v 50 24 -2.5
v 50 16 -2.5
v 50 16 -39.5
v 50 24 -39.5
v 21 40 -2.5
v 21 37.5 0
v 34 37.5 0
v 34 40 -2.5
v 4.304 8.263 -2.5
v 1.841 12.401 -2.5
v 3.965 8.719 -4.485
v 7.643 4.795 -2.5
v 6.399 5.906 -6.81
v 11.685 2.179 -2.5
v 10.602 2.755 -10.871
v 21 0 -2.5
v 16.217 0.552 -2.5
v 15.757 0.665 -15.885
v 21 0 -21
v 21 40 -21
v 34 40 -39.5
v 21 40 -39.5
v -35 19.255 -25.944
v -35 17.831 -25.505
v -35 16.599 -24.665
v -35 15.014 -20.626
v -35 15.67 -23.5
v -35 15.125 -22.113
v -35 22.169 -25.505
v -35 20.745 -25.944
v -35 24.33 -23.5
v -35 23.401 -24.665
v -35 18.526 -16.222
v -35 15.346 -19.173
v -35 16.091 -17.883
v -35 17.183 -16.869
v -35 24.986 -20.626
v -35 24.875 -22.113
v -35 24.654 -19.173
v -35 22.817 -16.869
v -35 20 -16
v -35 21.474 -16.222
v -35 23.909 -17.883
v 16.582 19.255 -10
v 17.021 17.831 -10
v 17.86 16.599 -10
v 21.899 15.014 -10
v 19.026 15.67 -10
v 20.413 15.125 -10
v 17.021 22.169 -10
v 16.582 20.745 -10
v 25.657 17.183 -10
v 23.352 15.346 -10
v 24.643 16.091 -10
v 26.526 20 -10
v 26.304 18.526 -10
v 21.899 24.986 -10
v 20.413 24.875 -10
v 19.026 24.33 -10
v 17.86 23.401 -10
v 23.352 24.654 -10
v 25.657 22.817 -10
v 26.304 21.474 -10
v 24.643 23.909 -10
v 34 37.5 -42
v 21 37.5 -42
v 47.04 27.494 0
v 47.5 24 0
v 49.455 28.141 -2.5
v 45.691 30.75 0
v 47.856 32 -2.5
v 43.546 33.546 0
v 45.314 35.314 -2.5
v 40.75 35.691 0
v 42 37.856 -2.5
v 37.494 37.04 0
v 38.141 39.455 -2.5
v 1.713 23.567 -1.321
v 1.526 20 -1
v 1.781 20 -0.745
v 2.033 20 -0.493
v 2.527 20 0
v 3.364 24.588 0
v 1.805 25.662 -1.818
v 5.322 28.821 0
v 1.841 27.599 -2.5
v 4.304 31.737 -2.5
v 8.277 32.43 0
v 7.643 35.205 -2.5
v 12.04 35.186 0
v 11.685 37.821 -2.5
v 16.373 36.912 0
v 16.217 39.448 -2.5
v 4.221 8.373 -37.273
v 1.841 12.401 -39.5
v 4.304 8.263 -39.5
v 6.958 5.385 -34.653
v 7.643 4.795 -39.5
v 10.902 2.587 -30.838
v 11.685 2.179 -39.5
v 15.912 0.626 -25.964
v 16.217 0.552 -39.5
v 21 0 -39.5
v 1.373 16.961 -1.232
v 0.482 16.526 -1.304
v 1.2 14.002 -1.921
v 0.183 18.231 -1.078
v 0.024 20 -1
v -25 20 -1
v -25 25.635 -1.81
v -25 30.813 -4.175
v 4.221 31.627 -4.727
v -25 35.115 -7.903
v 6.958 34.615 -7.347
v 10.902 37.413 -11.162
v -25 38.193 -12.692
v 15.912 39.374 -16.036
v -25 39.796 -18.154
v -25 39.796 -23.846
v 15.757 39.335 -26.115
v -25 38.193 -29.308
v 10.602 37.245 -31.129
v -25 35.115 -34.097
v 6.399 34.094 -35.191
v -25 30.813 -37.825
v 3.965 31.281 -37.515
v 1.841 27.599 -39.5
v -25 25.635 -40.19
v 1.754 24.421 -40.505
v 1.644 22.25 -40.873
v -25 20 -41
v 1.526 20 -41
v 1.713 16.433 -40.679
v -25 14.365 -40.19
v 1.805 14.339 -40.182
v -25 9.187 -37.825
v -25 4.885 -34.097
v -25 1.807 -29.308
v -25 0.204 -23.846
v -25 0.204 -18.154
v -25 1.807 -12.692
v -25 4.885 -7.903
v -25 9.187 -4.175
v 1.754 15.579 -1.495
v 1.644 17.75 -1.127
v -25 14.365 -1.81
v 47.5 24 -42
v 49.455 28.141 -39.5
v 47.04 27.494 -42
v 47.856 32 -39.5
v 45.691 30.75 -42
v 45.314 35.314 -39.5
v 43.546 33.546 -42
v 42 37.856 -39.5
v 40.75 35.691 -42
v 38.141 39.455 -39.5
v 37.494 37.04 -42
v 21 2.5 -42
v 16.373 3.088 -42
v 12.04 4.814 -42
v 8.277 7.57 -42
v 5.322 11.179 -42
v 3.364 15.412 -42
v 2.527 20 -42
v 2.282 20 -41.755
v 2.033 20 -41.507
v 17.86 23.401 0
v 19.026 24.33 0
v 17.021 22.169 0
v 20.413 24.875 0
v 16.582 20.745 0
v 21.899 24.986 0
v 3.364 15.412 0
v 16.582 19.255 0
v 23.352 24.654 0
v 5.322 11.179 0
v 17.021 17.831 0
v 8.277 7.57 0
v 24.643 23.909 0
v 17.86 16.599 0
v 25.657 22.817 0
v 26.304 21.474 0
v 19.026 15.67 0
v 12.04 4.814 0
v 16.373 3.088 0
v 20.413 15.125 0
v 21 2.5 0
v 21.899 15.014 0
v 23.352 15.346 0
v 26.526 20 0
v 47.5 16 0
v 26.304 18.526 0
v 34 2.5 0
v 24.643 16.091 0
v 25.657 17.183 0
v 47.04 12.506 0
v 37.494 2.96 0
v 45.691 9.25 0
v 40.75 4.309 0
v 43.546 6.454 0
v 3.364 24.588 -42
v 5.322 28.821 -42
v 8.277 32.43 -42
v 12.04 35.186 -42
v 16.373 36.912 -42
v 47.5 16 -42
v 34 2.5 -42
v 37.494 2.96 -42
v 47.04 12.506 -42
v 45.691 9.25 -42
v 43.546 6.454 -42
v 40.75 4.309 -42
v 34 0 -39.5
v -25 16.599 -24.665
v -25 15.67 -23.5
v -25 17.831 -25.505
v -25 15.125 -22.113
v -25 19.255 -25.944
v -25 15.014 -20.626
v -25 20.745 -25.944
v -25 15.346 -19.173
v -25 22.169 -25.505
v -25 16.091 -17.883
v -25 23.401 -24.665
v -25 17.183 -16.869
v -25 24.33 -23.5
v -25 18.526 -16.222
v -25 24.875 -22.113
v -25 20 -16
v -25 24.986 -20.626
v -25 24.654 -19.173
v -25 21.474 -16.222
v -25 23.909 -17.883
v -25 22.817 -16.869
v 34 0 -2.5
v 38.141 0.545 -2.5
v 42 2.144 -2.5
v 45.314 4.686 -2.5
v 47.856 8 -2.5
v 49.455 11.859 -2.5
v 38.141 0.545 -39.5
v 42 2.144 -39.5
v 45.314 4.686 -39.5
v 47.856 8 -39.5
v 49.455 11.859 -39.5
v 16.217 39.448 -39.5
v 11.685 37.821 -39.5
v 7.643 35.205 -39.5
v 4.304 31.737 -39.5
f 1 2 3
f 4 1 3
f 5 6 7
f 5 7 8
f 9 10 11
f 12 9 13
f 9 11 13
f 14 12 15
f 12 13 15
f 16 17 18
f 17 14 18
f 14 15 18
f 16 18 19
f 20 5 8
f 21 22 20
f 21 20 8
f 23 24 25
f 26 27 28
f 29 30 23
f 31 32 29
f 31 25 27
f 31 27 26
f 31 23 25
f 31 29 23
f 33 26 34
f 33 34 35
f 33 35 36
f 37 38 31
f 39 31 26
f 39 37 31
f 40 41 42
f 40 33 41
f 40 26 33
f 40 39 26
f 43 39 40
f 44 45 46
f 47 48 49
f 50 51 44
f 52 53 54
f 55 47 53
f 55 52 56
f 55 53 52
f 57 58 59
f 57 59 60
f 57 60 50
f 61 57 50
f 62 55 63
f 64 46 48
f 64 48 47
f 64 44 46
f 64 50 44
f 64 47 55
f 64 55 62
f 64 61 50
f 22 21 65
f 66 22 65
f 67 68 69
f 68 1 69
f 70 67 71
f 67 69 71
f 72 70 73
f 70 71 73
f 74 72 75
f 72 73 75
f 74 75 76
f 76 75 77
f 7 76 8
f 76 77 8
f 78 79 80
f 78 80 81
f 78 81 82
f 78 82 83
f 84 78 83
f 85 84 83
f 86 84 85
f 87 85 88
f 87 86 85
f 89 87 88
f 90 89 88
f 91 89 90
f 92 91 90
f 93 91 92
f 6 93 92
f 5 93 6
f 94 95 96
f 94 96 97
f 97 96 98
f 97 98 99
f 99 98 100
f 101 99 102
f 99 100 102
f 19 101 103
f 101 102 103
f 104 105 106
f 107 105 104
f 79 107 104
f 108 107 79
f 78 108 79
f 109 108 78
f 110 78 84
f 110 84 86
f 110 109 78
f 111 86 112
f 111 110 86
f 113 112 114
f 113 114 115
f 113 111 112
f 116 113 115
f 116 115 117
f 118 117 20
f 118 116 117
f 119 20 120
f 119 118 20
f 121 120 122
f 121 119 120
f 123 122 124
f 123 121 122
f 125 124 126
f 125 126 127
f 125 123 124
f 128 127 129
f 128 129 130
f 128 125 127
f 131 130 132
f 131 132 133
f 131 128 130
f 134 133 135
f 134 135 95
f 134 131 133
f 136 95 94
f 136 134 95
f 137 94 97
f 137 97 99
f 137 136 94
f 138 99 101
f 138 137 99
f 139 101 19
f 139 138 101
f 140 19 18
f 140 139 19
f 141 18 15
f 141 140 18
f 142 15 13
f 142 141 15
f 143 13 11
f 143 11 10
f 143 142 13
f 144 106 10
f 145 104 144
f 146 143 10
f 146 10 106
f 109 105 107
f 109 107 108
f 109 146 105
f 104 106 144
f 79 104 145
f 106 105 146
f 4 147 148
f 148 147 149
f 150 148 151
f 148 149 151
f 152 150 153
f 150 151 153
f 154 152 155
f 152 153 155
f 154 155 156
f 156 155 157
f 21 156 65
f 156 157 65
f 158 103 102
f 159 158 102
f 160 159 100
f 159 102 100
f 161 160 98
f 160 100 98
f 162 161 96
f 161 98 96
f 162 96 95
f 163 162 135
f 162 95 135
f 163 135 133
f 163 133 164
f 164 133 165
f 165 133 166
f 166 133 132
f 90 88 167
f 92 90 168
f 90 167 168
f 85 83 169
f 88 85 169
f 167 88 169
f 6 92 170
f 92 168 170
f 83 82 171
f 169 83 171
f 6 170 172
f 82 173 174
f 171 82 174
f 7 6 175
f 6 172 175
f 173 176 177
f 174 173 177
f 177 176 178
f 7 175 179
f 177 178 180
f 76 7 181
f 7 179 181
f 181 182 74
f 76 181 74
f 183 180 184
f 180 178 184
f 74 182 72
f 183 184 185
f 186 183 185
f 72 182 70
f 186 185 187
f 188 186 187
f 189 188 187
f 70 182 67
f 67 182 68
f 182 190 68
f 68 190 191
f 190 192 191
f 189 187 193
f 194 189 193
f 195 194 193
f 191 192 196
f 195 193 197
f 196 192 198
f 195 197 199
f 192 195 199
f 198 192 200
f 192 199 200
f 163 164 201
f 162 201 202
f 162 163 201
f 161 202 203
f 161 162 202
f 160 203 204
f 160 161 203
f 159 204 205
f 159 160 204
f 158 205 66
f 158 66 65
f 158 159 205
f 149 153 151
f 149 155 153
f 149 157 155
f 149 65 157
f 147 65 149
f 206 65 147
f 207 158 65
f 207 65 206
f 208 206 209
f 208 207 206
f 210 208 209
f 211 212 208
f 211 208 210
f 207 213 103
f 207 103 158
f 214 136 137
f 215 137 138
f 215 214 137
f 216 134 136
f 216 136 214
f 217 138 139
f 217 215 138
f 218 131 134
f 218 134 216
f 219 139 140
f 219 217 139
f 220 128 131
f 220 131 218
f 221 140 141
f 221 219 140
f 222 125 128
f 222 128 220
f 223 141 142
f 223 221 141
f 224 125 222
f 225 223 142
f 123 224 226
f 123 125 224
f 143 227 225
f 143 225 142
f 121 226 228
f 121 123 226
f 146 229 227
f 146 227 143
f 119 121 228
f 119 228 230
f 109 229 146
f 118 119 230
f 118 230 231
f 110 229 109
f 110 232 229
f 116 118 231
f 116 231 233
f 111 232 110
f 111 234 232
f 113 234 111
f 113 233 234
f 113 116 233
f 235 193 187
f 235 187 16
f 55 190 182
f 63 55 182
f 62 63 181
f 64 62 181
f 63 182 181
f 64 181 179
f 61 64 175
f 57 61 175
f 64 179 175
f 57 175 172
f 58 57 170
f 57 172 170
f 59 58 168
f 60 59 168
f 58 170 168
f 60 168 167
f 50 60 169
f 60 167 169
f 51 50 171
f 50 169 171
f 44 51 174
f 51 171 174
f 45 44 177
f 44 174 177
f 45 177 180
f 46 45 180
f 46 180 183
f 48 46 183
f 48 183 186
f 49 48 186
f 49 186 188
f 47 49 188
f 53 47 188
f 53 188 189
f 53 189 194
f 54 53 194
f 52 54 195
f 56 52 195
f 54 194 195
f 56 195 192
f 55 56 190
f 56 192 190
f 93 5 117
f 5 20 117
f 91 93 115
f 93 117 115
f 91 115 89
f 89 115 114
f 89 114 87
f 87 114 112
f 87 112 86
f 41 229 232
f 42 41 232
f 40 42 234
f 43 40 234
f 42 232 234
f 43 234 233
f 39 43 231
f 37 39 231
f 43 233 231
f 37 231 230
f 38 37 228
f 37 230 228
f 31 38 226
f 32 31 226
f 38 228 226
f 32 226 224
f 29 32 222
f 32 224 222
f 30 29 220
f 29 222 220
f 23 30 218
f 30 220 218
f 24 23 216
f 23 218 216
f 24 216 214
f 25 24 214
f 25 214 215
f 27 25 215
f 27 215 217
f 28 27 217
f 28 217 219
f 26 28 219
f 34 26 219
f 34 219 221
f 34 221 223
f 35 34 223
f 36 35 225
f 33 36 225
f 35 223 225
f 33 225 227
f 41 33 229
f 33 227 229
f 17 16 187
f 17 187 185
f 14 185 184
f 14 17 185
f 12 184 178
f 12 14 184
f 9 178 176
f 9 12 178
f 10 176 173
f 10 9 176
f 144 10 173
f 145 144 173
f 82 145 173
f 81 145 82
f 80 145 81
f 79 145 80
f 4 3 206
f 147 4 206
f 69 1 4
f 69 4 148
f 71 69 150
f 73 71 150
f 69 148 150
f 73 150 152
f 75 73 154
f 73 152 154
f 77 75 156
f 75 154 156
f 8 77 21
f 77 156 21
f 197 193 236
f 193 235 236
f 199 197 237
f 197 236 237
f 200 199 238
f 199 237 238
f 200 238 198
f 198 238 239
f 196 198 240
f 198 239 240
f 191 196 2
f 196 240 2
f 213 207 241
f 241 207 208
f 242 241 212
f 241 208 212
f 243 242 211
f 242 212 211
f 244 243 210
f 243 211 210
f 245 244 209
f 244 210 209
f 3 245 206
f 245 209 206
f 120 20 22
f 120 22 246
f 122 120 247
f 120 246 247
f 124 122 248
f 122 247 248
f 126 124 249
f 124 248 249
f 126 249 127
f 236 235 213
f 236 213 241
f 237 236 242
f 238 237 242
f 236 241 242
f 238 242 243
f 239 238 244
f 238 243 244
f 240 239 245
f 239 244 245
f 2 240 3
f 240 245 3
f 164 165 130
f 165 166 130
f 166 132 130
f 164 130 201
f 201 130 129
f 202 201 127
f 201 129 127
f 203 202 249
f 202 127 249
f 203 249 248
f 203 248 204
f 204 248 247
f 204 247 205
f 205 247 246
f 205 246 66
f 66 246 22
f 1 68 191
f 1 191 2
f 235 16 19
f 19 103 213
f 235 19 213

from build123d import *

# Parameters (mm, degrees)
SKETCH1_W           = 50
SKETCH1_H           = 42
BOSS_EXTRUDE1_DEPTH = 40
FILLET1_R           = 21
FILLET2_R           = 16
BOSS_EXTRUDE2_REACH = 96.81
SKETCH2_R           = 20
CHAMFER1_SIZE       = 2.5
SKETCH3_R           = 5
CUT_EXTRUDE1_DEPTH  = 10
SKETCH4_R           = 5
BOSS_EXTRUDE3_DEPTH = 10


with BuildPart() as part:
    # Sketch1 → Boss-Extrude1 (new body)
    with BuildSketch(Plane(origin=(0, 0, 0), x_dir=(1, 0, 0), z_dir=(0, 1, 0))):
        with Locations((25, 21)):
            Rectangle(SKETCH1_W, SKETCH1_H)
    extrude(amount=BOSS_EXTRUDE1_DEPTH)

    # Fillet1
    # the kernel refuses this fillet: 21 mm, written as the material it takes off along each edge
    with BuildSketch(Plane(origin=(0, 0, -94.5), x_dir=(0, 1, 0), z_dir=(0, 0, 1))) as fillet1_piece_1:
        with BuildLine():
            CenterArc((FILLET1_R, -FILLET1_R), FILLET1_R, 90, 90)
            Line((0, -FILLET1_R), (0, 0))
            Line((0, 0), (FILLET1_R, 0))
        make_face()
    extrude(amount=147, mode=Mode.SUBTRACT)
    with BuildSketch(Plane(origin=(0, 40, -94.5), x_dir=(0, -1, 0), z_dir=(0, 0, 1))) as fillet1_piece_2:
        with BuildLine():
            CenterArc((FILLET1_R, FILLET1_R), FILLET1_R, 180, 90)
            Line((0, FILLET1_R), (0, 0))
            Line((0, 0), (FILLET1_R, 0))
        make_face()
    extrude(amount=147, mode=Mode.SUBTRACT)

    # Fillet2
    fillet2_edges = [part.edges().sort_by_distance(p)[0] for p in [
        (50, 40, -21),
        (50, 0, -21),
    ]]
    fillet(fillet2_edges, radius=FILLET2_R)

    # Sketch2 → Boss-Extrude2 (add, up to next)
    with BuildSketch(Plane.ZY.offset(25), mode=Mode.PRIVATE) as boss_extrude2_sk1:
        with Locations((-21, 20)):
            Circle(SKETCH2_R)
    boss_extrude2_tool1 = extrude(boss_extrude2_sk1.sketch, amount=-BOSS_EXTRUDE2_REACH, mode=Mode.PRIVATE) - part.part
    add(boss_extrude2_tool1.solids().sort_by_distance((-25, 20, -21))[0])

    # Chamfer1
    # the kernel refuses this chamfer: 2.5 mm, written as the material it takes off along each edge
    with BuildSketch(Plane(origin=(21, 40, 0), x_dir=(0, -0.9996219169112968, 0.027495876610586334), z_dir=(1, 0, 0)), Plane(origin=(34, 0, -42), x_dir=(0, -0.027495876610586334, 0.9996219169112968), z_dir=(-1, 0, 0))) as chamfer1_piece_1:
        Polygon((CHAMFER1_SIZE * 0.999621916911, CHAMFER1_SIZE * 0.0274958766106), (-CHAMFER1_SIZE * 0.0274958766106, CHAMFER1_SIZE * 0.999621916911), (0, 0), align=None)
    extrude(amount=13, mode=Mode.SUBTRACT)
    with BuildSketch(Plane(origin=(34, 24, 0), x_dir=(1, 0, 0), z_dir=(0, -1, 0))) as chamfer1_piece_2:
        Polygon((16 - CHAMFER1_SIZE, 0), (16, -CHAMFER1_SIZE), (16, 0), align=None)
    revolve(axis=Axis((34, 24, 0), (0, 0, 1)), revolution_arc=90, mode=Mode.SUBTRACT)
    with BuildSketch(Plane(origin=(21, 19, 0), x_dir=(-0.9667409364669165, -0.25575762307127703, 0), z_dir=(0.25575762307127703, -0.9667409364669165, 0))) as chamfer1_piece_3_section:
        Polygon((21 - CHAMFER1_SIZE, 0), (21, CHAMFER1_SIZE), (21, 0), align=None)
    chamfer1_piece_3 = revolve(axis=Axis((21, 19, 0), (0, 0, -1)), revolution_arc=104.818482505, mode=Mode.PRIVATE)
    chamfer1_piece_3 = chamfer1_piece_3 - Plane(origin=(5.32298007, 20, -21), x_dir=(0, 0, 1), z_dir=(-1, 0, 0)) * Cylinder(20, 85, mode=Mode.PRIVATE)
    add(chamfer1_piece_3, mode=Mode.SUBTRACT)
    with BuildSketch(Plane(origin=(50, 16, 0), x_dir=(-0.9996219169112968, 0, 0.027495876610586334), z_dir=(0, 1, 0)), Plane(origin=(50, 16, -42), x_dir=(0.027495876610587663, 0, 0.9996219169112968), z_dir=(0, 1, 0))) as chamfer1_piece_4:
        Polygon((CHAMFER1_SIZE * 0.999621916911, -CHAMFER1_SIZE * 0.0274958766106), (-CHAMFER1_SIZE * 0.0274958766106, -CHAMFER1_SIZE * 0.999621916911), (0, 0), align=None)
    extrude(amount=8, mode=Mode.SUBTRACT)
    with BuildSketch(Plane(origin=(21, 21, 0), x_dir=(0, -1, 0), z_dir=(1, 0, 0))) as chamfer1_piece_5_section:
        Polygon((21 - CHAMFER1_SIZE, 0), (21, CHAMFER1_SIZE), (21, 0), align=None)
    chamfer1_piece_5 = revolve(axis=Axis((21, 21, 0), (0, 0, -1)), revolution_arc=104.818482505, mode=Mode.PRIVATE)
    chamfer1_piece_5 = chamfer1_piece_5 - Plane(origin=(5.322980064, 20, -21), x_dir=(0, 0, 1), z_dir=(-1, 0, 0)) * Cylinder(20, 84, mode=Mode.PRIVATE)
    add(chamfer1_piece_5, mode=Mode.SUBTRACT)
    with BuildSketch(Plane(origin=(34, 16, 0), x_dir=(0, -1, 0), z_dir=(-1, 0, 0))) as chamfer1_piece_6:
        Polygon((16 - CHAMFER1_SIZE, 0), (16, -CHAMFER1_SIZE), (16, 0), align=None)
    revolve(axis=Axis((34, 16, 0), (0, 0, 1)), revolution_arc=90, mode=Mode.SUBTRACT)
    with BuildSketch(Plane(origin=(21, 0, 0), x_dir=(0, 0.9996219169112968, 0.027495876610586372), z_dir=(1, 0, 0)), Plane(origin=(34, 40, -42), x_dir=(0, 0.027495876610587663, 0.9996219169112968), z_dir=(-1, 0, 0))) as chamfer1_piece_7:
        Polygon((CHAMFER1_SIZE * 0.999621916911, -CHAMFER1_SIZE * 0.0274958766106), (-CHAMFER1_SIZE * 0.0274958766106, -CHAMFER1_SIZE * 0.999621916911), (0, 0), align=None)
    extrude(amount=13, mode=Mode.SUBTRACT)
    with BuildSketch(Plane(origin=(34, 24, -42), x_dir=(1, 0, 0), z_dir=(0, -1, 0))) as chamfer1_piece_8:
        Polygon((16, CHAMFER1_SIZE), (16 - CHAMFER1_SIZE, 0), (16, 0), align=None)
    revolve(axis=Axis((34, 24, -42), (0, 0, 1)), revolution_arc=90, mode=Mode.SUBTRACT)
    with BuildSketch(Plane(origin=(21, 19, -42), x_dir=(-0.9667409364669164, -0.25575762307127753, 0), z_dir=(0.25575762307127753, -0.9667409364669164, 0))) as chamfer1_piece_9_section:
        Polygon((21 - CHAMFER1_SIZE, 0), (21, -CHAMFER1_SIZE), (21, 0), align=None)
    chamfer1_piece_9 = revolve(axis=Axis((21, 19, -42), (0, 0, -1)), revolution_arc=104.818482505, mode=Mode.PRIVATE)
    chamfer1_piece_9 = chamfer1_piece_9 - Plane(origin=(5.322980068, 20, -21), x_dir=(0, 0, 1), z_dir=(-1, 0, 0)) * Cylinder(20, 85, mode=Mode.PRIVATE)
    add(chamfer1_piece_9, mode=Mode.SUBTRACT)
    with BuildSketch(Plane(origin=(34, 16, -42), x_dir=(0, -1, 0), z_dir=(-1, 0, 0))) as chamfer1_piece_10:
        Polygon((16, CHAMFER1_SIZE), (16 - CHAMFER1_SIZE, 0), (16, 0), align=None)
    revolve(axis=Axis((34, 16, -42), (0, 0, 1)), revolution_arc=90, mode=Mode.SUBTRACT)
    with BuildSketch(Plane(origin=(21, 21, -42), x_dir=(0, -1, 0), z_dir=(1, 0, 0))) as chamfer1_piece_11_section:
        Polygon((21 - CHAMFER1_SIZE, 0), (21, -CHAMFER1_SIZE), (21, 0), align=None)
    chamfer1_piece_11 = revolve(axis=Axis((21, 21, -42), (0, 0, -1)), revolution_arc=104.818482505, mode=Mode.PRIVATE)
    chamfer1_piece_11 = chamfer1_piece_11 - Plane(origin=(5.322980065, 20, -21), x_dir=(0, 0, 1), z_dir=(-1, 0, 0)) * Cylinder(20, 84, mode=Mode.PRIVATE)
    add(chamfer1_piece_11, mode=Mode.SUBTRACT)

    # Sketch3 → Cut-Extrude1 (cut)
    with BuildSketch(Plane.XY):
        with Locations((21.525657906, 20)):
            Circle(SKETCH3_R)
    extrude(amount=-CUT_EXTRUDE1_DEPTH, mode=Mode.SUBTRACT)

    # Sketch4 → Boss-Extrude3 (add)
    with BuildSketch(Plane.ZY.offset(25)):
        with Locations((-21, 20)):
            Circle(SKETCH4_R)
    extrude(amount=BOSS_EXTRUDE3_DEPTH)


solid = part.part
